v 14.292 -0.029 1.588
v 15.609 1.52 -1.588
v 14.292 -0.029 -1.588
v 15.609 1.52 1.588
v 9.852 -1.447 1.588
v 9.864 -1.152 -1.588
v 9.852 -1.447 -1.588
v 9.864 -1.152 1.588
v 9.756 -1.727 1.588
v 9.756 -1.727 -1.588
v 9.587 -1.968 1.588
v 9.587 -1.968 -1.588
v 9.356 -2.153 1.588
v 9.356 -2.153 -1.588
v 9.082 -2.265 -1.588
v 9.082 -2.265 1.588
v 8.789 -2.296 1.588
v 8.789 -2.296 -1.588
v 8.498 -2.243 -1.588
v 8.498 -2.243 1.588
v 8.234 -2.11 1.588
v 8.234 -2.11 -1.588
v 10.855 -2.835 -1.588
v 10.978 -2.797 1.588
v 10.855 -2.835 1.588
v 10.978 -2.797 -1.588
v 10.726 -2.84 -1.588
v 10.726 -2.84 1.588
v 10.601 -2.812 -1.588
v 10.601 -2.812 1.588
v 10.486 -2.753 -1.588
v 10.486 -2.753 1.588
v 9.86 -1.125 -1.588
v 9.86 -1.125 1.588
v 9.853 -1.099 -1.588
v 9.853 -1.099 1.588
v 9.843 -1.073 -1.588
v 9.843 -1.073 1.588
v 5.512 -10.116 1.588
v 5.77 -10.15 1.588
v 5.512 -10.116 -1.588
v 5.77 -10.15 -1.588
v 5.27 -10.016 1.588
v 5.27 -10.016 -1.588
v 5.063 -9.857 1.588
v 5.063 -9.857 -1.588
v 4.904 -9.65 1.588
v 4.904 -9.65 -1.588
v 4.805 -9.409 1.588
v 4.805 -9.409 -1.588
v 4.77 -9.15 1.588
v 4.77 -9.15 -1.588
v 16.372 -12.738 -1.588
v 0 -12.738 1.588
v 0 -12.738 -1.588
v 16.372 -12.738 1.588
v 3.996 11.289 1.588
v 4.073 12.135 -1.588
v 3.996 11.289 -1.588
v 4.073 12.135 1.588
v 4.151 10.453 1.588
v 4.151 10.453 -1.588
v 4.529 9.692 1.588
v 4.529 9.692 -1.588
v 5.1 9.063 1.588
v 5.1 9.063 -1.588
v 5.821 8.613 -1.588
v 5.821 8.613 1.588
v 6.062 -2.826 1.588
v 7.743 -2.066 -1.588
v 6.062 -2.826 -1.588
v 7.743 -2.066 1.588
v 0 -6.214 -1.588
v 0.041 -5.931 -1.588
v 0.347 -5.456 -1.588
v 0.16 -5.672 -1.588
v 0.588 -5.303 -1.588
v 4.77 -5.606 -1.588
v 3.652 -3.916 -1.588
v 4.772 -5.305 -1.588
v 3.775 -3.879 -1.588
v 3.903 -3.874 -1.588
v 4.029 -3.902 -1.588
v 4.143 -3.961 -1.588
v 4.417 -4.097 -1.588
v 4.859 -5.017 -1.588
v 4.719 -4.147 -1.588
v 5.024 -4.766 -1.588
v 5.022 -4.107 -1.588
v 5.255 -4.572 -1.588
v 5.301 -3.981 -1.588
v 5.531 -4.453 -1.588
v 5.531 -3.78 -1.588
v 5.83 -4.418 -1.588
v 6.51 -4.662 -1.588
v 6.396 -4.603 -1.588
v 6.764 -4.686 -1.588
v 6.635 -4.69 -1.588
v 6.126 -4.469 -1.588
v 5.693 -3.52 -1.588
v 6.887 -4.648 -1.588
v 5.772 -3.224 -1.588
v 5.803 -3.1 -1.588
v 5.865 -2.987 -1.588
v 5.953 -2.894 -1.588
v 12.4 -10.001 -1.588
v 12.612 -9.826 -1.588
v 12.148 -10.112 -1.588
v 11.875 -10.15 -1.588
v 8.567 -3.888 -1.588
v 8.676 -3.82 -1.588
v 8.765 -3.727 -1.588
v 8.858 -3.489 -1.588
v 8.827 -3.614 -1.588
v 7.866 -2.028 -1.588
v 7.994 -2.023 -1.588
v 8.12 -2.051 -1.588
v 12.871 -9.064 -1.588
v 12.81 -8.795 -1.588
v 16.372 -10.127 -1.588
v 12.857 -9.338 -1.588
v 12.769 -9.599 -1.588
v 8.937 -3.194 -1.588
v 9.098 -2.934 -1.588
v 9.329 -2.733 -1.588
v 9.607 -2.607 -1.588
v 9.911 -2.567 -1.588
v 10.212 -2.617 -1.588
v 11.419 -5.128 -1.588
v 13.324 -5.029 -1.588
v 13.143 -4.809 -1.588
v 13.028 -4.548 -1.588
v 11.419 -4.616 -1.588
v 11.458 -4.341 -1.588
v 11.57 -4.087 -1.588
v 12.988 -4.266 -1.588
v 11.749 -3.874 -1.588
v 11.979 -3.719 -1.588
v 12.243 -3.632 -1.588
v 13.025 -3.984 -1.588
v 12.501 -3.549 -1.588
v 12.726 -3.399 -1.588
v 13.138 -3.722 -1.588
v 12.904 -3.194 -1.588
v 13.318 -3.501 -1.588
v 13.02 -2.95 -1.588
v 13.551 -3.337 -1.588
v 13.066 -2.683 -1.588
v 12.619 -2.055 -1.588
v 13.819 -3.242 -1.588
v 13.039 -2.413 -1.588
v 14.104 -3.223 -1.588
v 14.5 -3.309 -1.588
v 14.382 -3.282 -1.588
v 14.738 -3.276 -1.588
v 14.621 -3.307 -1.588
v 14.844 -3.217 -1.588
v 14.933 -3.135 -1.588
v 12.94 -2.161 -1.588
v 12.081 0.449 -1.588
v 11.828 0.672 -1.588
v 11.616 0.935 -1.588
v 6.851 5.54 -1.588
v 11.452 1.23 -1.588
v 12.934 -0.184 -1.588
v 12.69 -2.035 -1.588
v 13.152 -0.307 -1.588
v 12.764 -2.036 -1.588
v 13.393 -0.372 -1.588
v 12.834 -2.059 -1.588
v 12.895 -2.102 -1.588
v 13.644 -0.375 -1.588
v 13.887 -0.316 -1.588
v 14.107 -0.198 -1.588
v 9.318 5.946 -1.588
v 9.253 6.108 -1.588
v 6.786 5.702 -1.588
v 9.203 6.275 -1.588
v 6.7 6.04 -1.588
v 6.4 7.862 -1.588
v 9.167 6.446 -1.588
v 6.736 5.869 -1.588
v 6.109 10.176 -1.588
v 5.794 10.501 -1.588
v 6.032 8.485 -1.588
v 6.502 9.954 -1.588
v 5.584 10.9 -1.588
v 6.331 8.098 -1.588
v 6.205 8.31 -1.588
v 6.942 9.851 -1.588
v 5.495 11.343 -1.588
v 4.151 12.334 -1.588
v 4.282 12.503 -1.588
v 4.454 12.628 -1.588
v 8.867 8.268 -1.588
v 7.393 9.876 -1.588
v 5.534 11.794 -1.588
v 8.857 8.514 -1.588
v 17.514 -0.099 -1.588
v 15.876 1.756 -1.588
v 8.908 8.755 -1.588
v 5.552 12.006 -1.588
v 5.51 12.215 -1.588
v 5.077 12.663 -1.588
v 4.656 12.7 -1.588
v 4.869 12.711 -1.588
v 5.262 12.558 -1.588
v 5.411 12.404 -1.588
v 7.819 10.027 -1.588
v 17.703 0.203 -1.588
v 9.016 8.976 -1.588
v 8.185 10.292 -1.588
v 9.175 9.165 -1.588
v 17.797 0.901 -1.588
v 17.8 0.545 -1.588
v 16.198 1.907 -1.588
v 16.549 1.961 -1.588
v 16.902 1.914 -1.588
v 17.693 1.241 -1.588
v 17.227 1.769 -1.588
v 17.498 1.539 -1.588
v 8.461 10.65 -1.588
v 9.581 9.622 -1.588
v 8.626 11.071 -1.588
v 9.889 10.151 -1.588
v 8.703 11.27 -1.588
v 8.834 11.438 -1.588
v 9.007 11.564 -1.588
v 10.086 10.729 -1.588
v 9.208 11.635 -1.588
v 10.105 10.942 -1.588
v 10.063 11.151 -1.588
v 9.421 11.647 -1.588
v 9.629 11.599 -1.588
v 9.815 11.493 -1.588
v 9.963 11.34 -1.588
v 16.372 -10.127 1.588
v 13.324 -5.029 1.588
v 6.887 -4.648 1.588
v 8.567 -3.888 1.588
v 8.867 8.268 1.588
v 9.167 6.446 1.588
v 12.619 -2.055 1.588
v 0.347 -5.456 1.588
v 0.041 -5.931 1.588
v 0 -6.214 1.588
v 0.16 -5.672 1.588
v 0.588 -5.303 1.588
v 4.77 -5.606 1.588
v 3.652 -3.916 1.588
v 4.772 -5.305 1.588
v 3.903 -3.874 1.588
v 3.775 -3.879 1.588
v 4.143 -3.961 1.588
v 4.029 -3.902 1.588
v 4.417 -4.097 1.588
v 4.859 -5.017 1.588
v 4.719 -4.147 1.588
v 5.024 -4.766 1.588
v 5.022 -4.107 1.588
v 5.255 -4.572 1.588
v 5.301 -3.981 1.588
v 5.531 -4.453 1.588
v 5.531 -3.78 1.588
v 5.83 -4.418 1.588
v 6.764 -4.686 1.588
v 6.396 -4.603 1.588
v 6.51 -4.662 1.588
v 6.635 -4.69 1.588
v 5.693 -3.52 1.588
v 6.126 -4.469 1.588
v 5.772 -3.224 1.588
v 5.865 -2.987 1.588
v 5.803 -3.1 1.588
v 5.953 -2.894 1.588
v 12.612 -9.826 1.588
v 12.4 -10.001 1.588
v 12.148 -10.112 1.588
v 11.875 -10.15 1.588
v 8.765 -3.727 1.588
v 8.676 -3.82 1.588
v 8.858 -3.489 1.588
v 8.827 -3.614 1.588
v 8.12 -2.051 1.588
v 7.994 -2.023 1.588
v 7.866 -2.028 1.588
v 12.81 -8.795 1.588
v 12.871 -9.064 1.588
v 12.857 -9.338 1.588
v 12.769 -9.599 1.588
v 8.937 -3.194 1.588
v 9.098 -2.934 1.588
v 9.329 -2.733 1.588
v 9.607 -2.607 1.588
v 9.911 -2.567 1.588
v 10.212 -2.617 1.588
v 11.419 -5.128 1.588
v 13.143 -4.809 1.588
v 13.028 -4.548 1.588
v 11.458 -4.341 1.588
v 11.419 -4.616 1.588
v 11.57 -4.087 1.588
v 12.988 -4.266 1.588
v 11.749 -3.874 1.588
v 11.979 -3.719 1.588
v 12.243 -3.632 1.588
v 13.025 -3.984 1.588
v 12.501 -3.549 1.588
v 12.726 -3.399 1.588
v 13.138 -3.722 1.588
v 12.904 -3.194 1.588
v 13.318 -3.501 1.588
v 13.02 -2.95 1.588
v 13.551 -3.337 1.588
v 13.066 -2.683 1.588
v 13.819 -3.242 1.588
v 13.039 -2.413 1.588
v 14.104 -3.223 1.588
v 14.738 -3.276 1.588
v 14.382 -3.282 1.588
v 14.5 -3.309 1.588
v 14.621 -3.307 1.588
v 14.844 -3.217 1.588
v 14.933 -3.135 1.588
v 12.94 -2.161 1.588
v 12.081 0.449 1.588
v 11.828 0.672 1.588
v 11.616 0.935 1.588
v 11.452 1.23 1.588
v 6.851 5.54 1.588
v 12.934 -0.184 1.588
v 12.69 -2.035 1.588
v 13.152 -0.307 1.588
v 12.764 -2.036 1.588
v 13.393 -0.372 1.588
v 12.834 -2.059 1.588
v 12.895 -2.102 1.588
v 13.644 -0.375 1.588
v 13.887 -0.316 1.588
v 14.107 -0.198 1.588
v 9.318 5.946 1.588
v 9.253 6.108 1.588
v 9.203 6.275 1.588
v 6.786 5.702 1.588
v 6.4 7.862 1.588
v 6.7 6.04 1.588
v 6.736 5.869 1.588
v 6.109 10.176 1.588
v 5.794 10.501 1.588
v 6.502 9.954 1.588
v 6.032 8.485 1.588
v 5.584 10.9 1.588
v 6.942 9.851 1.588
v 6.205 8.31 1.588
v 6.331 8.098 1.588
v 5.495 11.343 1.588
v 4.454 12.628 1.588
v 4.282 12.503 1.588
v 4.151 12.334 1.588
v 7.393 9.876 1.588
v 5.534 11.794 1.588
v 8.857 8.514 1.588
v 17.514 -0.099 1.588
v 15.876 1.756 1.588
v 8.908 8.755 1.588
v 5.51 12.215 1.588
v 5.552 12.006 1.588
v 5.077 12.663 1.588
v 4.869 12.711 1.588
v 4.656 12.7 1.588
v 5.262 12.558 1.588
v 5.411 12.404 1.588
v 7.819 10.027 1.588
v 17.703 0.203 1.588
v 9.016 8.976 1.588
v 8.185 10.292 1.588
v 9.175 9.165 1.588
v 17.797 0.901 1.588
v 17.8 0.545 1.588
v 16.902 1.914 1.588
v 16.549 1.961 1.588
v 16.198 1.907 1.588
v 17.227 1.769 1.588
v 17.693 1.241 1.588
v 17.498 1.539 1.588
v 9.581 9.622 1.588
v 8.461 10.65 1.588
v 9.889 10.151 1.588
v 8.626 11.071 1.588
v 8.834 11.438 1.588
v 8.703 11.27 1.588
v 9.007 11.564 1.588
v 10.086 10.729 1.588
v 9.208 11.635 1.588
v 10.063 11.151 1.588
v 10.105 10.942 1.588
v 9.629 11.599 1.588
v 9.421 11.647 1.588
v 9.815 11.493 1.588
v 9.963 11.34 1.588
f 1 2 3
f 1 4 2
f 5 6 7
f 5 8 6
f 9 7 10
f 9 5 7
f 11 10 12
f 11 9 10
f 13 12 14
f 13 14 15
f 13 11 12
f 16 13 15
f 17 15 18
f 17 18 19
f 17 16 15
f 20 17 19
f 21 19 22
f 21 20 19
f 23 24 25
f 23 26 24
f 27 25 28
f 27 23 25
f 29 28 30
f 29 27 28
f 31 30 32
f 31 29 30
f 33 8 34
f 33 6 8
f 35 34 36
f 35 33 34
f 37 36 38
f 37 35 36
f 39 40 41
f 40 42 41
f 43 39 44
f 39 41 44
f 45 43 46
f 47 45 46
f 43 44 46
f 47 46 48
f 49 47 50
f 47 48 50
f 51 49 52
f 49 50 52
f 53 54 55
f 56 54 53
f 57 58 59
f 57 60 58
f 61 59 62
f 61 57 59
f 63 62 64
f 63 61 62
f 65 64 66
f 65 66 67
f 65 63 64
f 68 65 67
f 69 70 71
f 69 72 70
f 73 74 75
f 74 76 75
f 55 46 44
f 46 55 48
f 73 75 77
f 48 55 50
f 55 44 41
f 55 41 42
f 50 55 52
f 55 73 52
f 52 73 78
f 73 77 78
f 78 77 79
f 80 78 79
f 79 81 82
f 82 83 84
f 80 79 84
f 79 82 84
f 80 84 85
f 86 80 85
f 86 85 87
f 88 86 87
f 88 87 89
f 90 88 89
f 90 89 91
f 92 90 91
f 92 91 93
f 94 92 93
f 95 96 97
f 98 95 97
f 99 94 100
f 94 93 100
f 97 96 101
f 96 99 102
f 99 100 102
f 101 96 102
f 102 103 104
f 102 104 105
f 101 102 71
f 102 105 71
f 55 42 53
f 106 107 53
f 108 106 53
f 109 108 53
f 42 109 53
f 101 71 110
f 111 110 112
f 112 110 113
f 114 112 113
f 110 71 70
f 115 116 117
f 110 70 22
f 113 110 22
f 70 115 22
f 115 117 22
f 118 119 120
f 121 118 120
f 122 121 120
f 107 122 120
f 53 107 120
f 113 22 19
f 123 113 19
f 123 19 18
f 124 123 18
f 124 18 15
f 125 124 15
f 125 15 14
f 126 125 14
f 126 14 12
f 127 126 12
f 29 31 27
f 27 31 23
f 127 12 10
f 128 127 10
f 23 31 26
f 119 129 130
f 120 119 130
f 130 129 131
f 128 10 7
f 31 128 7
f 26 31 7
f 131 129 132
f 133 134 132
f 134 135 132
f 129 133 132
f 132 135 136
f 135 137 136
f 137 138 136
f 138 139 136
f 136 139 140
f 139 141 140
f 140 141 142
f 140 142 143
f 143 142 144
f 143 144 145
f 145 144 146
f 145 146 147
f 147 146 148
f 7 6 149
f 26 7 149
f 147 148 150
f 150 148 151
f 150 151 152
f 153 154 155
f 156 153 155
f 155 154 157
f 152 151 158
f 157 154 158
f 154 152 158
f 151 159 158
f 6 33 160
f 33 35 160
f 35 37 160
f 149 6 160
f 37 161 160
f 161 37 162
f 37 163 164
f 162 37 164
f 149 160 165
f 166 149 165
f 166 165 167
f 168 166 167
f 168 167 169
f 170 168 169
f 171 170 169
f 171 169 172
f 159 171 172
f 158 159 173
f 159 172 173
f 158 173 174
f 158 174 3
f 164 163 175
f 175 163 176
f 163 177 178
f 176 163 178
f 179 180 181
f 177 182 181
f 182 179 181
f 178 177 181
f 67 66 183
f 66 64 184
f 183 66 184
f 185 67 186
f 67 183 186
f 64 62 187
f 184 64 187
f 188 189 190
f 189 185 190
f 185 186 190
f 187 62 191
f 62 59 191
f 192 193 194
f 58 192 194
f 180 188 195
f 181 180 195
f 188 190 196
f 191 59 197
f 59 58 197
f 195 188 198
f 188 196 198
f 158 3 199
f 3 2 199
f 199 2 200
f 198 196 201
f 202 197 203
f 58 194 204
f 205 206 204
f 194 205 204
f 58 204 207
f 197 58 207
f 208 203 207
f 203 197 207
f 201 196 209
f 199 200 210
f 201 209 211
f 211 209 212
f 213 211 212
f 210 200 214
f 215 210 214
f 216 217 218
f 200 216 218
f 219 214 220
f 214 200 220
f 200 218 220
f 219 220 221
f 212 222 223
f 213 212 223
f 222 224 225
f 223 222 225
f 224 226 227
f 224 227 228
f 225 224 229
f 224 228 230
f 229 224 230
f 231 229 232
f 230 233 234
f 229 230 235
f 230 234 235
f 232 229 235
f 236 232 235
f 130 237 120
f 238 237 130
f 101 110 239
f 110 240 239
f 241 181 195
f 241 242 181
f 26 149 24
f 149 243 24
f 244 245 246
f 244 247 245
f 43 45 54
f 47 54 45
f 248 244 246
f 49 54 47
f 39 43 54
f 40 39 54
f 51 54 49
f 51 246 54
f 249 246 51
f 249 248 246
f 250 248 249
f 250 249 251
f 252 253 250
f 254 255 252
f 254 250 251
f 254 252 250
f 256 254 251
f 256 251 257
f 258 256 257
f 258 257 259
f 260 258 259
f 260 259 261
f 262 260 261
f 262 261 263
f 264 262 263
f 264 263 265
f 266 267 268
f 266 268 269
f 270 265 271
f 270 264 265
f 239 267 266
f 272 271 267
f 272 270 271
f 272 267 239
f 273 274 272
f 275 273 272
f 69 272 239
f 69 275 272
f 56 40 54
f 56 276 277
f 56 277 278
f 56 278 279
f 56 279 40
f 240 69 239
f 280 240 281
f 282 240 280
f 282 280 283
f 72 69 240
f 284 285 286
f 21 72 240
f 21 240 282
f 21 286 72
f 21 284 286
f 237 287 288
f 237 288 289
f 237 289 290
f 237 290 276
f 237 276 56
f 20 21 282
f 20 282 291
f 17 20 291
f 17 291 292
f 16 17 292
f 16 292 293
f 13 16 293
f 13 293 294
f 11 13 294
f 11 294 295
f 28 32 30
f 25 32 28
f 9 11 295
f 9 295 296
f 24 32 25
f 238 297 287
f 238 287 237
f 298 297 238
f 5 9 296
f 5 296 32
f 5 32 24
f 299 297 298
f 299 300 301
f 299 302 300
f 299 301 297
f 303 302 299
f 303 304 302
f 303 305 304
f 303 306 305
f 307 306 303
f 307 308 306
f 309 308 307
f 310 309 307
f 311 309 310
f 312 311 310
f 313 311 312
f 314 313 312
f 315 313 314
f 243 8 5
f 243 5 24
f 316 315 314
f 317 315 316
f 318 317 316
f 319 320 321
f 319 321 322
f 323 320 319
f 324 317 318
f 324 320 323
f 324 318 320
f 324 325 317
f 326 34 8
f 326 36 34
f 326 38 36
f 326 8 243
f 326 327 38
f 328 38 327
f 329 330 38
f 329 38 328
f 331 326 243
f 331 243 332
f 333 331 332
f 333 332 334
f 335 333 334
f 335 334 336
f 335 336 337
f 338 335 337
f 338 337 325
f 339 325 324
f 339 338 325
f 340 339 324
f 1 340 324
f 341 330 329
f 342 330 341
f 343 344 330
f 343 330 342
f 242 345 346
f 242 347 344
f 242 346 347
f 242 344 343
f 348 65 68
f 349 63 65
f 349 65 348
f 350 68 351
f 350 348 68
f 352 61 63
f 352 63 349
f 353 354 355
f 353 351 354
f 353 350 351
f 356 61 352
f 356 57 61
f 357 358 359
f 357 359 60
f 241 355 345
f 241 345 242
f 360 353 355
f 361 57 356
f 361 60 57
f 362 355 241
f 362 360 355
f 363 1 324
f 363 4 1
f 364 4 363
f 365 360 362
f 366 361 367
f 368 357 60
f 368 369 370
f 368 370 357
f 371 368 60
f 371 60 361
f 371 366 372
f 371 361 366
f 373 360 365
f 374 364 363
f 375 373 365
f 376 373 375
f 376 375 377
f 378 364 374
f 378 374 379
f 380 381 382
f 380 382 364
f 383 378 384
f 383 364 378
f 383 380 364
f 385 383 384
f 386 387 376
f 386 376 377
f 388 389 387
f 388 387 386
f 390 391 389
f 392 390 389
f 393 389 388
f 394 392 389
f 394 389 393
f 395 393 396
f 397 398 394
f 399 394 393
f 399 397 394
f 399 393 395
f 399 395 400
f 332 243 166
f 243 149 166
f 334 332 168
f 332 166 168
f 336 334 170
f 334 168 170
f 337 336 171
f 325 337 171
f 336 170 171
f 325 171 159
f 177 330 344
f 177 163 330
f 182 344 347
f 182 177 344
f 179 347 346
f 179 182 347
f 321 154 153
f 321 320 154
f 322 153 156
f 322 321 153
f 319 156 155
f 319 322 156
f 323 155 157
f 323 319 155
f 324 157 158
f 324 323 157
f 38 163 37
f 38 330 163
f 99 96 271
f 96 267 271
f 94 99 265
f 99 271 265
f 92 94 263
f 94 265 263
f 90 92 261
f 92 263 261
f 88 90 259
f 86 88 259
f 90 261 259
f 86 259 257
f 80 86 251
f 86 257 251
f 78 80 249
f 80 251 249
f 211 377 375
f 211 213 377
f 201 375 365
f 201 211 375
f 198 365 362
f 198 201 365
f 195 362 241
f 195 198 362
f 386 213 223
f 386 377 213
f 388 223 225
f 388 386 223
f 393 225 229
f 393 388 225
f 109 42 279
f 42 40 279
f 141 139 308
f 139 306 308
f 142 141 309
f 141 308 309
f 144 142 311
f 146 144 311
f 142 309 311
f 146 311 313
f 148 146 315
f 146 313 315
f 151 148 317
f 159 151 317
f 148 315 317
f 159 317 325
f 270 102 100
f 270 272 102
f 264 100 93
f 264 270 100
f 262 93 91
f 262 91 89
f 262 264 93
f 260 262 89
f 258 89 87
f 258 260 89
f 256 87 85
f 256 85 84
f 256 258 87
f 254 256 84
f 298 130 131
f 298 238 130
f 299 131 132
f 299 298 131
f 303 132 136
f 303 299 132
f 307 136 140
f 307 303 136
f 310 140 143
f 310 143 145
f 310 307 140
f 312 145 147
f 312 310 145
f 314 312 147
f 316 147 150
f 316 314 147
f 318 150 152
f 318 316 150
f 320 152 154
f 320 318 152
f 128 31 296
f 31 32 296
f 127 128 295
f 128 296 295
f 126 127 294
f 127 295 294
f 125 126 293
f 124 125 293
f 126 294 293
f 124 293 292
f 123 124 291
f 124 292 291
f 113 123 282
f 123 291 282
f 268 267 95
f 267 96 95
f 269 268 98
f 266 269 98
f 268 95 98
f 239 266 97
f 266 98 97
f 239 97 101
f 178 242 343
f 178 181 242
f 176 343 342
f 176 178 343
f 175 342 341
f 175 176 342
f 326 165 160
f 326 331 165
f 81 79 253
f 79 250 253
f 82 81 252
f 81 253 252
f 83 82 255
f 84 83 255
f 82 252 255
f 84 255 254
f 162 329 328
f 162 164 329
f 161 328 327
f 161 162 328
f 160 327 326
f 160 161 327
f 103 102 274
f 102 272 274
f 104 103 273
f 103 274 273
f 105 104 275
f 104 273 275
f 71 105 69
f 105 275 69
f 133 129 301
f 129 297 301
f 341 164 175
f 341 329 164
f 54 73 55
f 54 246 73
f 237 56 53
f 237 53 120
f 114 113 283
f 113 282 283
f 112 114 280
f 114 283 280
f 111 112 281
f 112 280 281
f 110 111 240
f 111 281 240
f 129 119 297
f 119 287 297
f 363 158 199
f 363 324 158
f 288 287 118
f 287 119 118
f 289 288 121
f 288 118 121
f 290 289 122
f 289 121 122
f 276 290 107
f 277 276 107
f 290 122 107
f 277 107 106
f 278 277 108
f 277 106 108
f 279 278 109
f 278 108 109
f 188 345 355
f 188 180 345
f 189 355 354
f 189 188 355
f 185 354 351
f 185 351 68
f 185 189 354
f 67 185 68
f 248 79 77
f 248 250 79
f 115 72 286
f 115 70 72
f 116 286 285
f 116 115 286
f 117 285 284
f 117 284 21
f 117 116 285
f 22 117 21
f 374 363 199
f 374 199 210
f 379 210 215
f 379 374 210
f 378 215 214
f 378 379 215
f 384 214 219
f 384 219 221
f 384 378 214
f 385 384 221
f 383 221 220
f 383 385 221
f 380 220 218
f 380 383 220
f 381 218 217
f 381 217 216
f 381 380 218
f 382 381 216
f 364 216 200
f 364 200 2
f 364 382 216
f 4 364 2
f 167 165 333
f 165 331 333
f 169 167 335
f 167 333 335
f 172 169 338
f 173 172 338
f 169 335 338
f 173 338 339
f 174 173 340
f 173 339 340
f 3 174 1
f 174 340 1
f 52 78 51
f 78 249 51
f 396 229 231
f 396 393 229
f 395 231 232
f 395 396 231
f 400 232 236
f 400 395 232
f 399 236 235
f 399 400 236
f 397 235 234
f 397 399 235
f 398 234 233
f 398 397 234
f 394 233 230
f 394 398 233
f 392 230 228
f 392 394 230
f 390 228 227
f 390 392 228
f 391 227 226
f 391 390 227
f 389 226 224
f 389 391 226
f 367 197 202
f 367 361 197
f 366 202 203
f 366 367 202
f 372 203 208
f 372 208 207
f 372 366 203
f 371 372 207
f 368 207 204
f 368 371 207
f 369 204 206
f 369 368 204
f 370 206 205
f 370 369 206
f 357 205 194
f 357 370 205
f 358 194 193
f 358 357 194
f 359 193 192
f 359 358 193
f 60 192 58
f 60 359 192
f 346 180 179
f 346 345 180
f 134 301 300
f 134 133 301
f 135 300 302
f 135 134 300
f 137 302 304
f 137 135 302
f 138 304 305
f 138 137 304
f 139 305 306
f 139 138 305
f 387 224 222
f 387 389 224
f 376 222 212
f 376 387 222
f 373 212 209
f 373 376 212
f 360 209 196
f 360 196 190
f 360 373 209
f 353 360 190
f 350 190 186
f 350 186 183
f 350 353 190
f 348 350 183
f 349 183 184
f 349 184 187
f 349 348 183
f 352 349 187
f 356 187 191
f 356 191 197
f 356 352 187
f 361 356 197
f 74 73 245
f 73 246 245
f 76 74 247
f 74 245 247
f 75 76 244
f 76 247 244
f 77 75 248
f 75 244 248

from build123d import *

# Parameters (mm, degrees)
BOSS_CONFIGUP_DEPTH = 1.5875
FILLET1_R           = 1
FILLET2_R           = 1
FILLET3_R           = 0.5
FILLET4_R           = 0.25
FILLET5_R           = 2
FILLET7_R           = 1


with BuildPart() as part:
    # Sketch-ConfigUp → Boss-ConfigUp (new body, symmetric)
    with BuildSketch(Plane.XY):
        with BuildLine():
            Line((8.036884771, -1.932633536), (5.768256233, -2.958998264))
            ThreePointArc((5.768256233, -2.958998264), (5.166306437, -4.054514783), (3.946064636, -3.783387604))
            Line((3.946064636, -3.783387604), (0, -5.568651912))
            Line((0, -5.568651912), (0, -12.738236644))
            Line((0, -12.738236644), (16.372100646, -12.738236644))
            Line((16.372100646, -12.738236644), (16.372100646, -10.126726416))
            Line((16.372100646, -10.126726416), (13.32406834, -5.02866566))
            ThreePointArc((13.32406834, -5.02866566), (13.235492103, -3.587430718), (14.672142717, -3.442382733))
            Line((14.672142717, -3.442382733), (17.513873441, -0.098510164))
            ThreePointArc((17.513873441, -0.098510164), (17.370838202, 1.663460585), (15.608867453, 1.520425346))
            Line((15.608867453, 1.520425346), (13.685572067, -0.742721767))
            Line((13.685572067, -0.742721767), (11.665230115, 0.757902988))
            Line((11.665230115, 0.757902988), (9.20945182, 6.186040346))
            Line((9.20945182, 6.186040346), (8.77136122, 8.849335746))
            ThreePointArc((8.77136122, 8.849335746), (9.609835457, 9.662661067), (10.086138806, 10.729278263))
            ThreePointArc((10.086138806, 10.729278263), (9.52657217, 11.630324976), (8.625525457, 11.07075834))
            ThreePointArc((8.625525457, 11.07075834), (6.718309914, 9.886342294), (5.533893867, 11.793557837))
            ThreePointArc((5.533893867, 11.793557837), (4.974327231, 12.69460455), (4.073280517, 12.135037914))
            ThreePointArc((4.073280517, 12.135037914), (4.437375542, 9.835058641), (6.304511976, 8.443558952))
            Line((6.304511976, 8.443558952), (6.742602576, 5.780263553))
            Line((6.742602576, 5.780263553), (9.859076368, -1.108244196))
            ThreePointArc((9.859076368, -1.108244196), (9.257126572, -2.203760715), (8.036884771, -1.932633536))
        make_face()
        with BuildLine():
            Line((8.861274111, -3.754825133), (6.592645572, -4.781189861))
            ThreePointArc((6.592645572, -4.781189861), (5.372403771, -4.510062682), (4.770453975, -5.605579201))
            Line((4.770453975, -5.605579201), (4.770453975, -10.149803039))
            Line((4.770453975, -10.149803039), (6.154904632, -10.149803039))
            Line((6.154904632, -10.149803039), (11.419062352, -10.149803039))
            Line((11.419062352, -10.149803039), (13.32406834, -10.149803039))
            Line((13.32406834, -10.149803039), (11.419062352, -5.128381701))
            Line((11.419062352, -5.128381701), (11.419062352, -3.40973015))
            ThreePointArc((11.419062352, -3.40973015), (12.78717247, -3.341145376), (12.803247984, -1.971411553))
            Line((12.803247984, -1.971411553), (10.683465708, -2.930435793))
            ThreePointArc((10.683465708, -2.930435793), (9.463223907, -2.659308614), (8.861274111, -3.754825133))
        make_face(mode=Mode.SUBTRACT)
    extrude(amount=BOSS_CONFIGUP_DEPTH, both=True)

    # Fillet1
    fillet1_edges = [part.edges().sort_by_distance(p)[0] for p in [
        (0, -5.568651912, 0),
        (6.304511976, 8.443558952, 0),
        (8.77136122, 8.849335746, 0),
        (13.685572067, -0.742721767, 0),
    ]]
    fillet(fillet1_edges, radius=FILLET1_R)

    # Fillet2
    fillet2_edges = [part.edges().sort_by_distance(p)[0] for p in [
        (11.419062352, -3.40973015, 0),
    ]]
    fillet(fillet2_edges, radius=FILLET2_R)

    # Fillet3
    fillet3_edges = [part.edges().sort_by_distance(p)[0] for p in [
        (3.946064636, -3.783387604, 0),
        (5.768256233, -2.958998264, 0),
        (8.036884771, -1.932633536, 0),
        (14.672142717, -3.442382733, 0),
        (6.592645572, -4.781189861, 0),
        (10.683465708, -2.930435793, 0),
        (8.861274111, -3.754825133, 0),
    ]]
    fillet(fillet3_edges, radius=FILLET3_R)

    # Fillet4
    fillet4_edges = [part.edges().sort_by_distance(p)[0] for p in [
        (9.859076368, -1.108244196, 0),
        (12.803247984, -1.971411553, 0),
    ]]
    fillet(fillet4_edges, radius=FILLET4_R)

    # Fillet5
    fillet5_edges = [part.edges().sort_by_distance(p)[0] for p in [
        (6.742602576, 5.780263553, 0),
        (9.20945182, 6.186040346, 0),
        (11.665230115, 0.757902988, 0),
    ]]
    fillet(fillet5_edges, radius=FILLET5_R)

    # Fillet7
    fillet7_edges = [part.edges().sort_by_distance(p)[0] for p in [
        (4.770453975, -10.149803039, 0),
        (13.32406834, -10.149803039, 0),
    ]]
    fillet(fillet7_edges, radius=FILLET7_R)


solid = part.part
